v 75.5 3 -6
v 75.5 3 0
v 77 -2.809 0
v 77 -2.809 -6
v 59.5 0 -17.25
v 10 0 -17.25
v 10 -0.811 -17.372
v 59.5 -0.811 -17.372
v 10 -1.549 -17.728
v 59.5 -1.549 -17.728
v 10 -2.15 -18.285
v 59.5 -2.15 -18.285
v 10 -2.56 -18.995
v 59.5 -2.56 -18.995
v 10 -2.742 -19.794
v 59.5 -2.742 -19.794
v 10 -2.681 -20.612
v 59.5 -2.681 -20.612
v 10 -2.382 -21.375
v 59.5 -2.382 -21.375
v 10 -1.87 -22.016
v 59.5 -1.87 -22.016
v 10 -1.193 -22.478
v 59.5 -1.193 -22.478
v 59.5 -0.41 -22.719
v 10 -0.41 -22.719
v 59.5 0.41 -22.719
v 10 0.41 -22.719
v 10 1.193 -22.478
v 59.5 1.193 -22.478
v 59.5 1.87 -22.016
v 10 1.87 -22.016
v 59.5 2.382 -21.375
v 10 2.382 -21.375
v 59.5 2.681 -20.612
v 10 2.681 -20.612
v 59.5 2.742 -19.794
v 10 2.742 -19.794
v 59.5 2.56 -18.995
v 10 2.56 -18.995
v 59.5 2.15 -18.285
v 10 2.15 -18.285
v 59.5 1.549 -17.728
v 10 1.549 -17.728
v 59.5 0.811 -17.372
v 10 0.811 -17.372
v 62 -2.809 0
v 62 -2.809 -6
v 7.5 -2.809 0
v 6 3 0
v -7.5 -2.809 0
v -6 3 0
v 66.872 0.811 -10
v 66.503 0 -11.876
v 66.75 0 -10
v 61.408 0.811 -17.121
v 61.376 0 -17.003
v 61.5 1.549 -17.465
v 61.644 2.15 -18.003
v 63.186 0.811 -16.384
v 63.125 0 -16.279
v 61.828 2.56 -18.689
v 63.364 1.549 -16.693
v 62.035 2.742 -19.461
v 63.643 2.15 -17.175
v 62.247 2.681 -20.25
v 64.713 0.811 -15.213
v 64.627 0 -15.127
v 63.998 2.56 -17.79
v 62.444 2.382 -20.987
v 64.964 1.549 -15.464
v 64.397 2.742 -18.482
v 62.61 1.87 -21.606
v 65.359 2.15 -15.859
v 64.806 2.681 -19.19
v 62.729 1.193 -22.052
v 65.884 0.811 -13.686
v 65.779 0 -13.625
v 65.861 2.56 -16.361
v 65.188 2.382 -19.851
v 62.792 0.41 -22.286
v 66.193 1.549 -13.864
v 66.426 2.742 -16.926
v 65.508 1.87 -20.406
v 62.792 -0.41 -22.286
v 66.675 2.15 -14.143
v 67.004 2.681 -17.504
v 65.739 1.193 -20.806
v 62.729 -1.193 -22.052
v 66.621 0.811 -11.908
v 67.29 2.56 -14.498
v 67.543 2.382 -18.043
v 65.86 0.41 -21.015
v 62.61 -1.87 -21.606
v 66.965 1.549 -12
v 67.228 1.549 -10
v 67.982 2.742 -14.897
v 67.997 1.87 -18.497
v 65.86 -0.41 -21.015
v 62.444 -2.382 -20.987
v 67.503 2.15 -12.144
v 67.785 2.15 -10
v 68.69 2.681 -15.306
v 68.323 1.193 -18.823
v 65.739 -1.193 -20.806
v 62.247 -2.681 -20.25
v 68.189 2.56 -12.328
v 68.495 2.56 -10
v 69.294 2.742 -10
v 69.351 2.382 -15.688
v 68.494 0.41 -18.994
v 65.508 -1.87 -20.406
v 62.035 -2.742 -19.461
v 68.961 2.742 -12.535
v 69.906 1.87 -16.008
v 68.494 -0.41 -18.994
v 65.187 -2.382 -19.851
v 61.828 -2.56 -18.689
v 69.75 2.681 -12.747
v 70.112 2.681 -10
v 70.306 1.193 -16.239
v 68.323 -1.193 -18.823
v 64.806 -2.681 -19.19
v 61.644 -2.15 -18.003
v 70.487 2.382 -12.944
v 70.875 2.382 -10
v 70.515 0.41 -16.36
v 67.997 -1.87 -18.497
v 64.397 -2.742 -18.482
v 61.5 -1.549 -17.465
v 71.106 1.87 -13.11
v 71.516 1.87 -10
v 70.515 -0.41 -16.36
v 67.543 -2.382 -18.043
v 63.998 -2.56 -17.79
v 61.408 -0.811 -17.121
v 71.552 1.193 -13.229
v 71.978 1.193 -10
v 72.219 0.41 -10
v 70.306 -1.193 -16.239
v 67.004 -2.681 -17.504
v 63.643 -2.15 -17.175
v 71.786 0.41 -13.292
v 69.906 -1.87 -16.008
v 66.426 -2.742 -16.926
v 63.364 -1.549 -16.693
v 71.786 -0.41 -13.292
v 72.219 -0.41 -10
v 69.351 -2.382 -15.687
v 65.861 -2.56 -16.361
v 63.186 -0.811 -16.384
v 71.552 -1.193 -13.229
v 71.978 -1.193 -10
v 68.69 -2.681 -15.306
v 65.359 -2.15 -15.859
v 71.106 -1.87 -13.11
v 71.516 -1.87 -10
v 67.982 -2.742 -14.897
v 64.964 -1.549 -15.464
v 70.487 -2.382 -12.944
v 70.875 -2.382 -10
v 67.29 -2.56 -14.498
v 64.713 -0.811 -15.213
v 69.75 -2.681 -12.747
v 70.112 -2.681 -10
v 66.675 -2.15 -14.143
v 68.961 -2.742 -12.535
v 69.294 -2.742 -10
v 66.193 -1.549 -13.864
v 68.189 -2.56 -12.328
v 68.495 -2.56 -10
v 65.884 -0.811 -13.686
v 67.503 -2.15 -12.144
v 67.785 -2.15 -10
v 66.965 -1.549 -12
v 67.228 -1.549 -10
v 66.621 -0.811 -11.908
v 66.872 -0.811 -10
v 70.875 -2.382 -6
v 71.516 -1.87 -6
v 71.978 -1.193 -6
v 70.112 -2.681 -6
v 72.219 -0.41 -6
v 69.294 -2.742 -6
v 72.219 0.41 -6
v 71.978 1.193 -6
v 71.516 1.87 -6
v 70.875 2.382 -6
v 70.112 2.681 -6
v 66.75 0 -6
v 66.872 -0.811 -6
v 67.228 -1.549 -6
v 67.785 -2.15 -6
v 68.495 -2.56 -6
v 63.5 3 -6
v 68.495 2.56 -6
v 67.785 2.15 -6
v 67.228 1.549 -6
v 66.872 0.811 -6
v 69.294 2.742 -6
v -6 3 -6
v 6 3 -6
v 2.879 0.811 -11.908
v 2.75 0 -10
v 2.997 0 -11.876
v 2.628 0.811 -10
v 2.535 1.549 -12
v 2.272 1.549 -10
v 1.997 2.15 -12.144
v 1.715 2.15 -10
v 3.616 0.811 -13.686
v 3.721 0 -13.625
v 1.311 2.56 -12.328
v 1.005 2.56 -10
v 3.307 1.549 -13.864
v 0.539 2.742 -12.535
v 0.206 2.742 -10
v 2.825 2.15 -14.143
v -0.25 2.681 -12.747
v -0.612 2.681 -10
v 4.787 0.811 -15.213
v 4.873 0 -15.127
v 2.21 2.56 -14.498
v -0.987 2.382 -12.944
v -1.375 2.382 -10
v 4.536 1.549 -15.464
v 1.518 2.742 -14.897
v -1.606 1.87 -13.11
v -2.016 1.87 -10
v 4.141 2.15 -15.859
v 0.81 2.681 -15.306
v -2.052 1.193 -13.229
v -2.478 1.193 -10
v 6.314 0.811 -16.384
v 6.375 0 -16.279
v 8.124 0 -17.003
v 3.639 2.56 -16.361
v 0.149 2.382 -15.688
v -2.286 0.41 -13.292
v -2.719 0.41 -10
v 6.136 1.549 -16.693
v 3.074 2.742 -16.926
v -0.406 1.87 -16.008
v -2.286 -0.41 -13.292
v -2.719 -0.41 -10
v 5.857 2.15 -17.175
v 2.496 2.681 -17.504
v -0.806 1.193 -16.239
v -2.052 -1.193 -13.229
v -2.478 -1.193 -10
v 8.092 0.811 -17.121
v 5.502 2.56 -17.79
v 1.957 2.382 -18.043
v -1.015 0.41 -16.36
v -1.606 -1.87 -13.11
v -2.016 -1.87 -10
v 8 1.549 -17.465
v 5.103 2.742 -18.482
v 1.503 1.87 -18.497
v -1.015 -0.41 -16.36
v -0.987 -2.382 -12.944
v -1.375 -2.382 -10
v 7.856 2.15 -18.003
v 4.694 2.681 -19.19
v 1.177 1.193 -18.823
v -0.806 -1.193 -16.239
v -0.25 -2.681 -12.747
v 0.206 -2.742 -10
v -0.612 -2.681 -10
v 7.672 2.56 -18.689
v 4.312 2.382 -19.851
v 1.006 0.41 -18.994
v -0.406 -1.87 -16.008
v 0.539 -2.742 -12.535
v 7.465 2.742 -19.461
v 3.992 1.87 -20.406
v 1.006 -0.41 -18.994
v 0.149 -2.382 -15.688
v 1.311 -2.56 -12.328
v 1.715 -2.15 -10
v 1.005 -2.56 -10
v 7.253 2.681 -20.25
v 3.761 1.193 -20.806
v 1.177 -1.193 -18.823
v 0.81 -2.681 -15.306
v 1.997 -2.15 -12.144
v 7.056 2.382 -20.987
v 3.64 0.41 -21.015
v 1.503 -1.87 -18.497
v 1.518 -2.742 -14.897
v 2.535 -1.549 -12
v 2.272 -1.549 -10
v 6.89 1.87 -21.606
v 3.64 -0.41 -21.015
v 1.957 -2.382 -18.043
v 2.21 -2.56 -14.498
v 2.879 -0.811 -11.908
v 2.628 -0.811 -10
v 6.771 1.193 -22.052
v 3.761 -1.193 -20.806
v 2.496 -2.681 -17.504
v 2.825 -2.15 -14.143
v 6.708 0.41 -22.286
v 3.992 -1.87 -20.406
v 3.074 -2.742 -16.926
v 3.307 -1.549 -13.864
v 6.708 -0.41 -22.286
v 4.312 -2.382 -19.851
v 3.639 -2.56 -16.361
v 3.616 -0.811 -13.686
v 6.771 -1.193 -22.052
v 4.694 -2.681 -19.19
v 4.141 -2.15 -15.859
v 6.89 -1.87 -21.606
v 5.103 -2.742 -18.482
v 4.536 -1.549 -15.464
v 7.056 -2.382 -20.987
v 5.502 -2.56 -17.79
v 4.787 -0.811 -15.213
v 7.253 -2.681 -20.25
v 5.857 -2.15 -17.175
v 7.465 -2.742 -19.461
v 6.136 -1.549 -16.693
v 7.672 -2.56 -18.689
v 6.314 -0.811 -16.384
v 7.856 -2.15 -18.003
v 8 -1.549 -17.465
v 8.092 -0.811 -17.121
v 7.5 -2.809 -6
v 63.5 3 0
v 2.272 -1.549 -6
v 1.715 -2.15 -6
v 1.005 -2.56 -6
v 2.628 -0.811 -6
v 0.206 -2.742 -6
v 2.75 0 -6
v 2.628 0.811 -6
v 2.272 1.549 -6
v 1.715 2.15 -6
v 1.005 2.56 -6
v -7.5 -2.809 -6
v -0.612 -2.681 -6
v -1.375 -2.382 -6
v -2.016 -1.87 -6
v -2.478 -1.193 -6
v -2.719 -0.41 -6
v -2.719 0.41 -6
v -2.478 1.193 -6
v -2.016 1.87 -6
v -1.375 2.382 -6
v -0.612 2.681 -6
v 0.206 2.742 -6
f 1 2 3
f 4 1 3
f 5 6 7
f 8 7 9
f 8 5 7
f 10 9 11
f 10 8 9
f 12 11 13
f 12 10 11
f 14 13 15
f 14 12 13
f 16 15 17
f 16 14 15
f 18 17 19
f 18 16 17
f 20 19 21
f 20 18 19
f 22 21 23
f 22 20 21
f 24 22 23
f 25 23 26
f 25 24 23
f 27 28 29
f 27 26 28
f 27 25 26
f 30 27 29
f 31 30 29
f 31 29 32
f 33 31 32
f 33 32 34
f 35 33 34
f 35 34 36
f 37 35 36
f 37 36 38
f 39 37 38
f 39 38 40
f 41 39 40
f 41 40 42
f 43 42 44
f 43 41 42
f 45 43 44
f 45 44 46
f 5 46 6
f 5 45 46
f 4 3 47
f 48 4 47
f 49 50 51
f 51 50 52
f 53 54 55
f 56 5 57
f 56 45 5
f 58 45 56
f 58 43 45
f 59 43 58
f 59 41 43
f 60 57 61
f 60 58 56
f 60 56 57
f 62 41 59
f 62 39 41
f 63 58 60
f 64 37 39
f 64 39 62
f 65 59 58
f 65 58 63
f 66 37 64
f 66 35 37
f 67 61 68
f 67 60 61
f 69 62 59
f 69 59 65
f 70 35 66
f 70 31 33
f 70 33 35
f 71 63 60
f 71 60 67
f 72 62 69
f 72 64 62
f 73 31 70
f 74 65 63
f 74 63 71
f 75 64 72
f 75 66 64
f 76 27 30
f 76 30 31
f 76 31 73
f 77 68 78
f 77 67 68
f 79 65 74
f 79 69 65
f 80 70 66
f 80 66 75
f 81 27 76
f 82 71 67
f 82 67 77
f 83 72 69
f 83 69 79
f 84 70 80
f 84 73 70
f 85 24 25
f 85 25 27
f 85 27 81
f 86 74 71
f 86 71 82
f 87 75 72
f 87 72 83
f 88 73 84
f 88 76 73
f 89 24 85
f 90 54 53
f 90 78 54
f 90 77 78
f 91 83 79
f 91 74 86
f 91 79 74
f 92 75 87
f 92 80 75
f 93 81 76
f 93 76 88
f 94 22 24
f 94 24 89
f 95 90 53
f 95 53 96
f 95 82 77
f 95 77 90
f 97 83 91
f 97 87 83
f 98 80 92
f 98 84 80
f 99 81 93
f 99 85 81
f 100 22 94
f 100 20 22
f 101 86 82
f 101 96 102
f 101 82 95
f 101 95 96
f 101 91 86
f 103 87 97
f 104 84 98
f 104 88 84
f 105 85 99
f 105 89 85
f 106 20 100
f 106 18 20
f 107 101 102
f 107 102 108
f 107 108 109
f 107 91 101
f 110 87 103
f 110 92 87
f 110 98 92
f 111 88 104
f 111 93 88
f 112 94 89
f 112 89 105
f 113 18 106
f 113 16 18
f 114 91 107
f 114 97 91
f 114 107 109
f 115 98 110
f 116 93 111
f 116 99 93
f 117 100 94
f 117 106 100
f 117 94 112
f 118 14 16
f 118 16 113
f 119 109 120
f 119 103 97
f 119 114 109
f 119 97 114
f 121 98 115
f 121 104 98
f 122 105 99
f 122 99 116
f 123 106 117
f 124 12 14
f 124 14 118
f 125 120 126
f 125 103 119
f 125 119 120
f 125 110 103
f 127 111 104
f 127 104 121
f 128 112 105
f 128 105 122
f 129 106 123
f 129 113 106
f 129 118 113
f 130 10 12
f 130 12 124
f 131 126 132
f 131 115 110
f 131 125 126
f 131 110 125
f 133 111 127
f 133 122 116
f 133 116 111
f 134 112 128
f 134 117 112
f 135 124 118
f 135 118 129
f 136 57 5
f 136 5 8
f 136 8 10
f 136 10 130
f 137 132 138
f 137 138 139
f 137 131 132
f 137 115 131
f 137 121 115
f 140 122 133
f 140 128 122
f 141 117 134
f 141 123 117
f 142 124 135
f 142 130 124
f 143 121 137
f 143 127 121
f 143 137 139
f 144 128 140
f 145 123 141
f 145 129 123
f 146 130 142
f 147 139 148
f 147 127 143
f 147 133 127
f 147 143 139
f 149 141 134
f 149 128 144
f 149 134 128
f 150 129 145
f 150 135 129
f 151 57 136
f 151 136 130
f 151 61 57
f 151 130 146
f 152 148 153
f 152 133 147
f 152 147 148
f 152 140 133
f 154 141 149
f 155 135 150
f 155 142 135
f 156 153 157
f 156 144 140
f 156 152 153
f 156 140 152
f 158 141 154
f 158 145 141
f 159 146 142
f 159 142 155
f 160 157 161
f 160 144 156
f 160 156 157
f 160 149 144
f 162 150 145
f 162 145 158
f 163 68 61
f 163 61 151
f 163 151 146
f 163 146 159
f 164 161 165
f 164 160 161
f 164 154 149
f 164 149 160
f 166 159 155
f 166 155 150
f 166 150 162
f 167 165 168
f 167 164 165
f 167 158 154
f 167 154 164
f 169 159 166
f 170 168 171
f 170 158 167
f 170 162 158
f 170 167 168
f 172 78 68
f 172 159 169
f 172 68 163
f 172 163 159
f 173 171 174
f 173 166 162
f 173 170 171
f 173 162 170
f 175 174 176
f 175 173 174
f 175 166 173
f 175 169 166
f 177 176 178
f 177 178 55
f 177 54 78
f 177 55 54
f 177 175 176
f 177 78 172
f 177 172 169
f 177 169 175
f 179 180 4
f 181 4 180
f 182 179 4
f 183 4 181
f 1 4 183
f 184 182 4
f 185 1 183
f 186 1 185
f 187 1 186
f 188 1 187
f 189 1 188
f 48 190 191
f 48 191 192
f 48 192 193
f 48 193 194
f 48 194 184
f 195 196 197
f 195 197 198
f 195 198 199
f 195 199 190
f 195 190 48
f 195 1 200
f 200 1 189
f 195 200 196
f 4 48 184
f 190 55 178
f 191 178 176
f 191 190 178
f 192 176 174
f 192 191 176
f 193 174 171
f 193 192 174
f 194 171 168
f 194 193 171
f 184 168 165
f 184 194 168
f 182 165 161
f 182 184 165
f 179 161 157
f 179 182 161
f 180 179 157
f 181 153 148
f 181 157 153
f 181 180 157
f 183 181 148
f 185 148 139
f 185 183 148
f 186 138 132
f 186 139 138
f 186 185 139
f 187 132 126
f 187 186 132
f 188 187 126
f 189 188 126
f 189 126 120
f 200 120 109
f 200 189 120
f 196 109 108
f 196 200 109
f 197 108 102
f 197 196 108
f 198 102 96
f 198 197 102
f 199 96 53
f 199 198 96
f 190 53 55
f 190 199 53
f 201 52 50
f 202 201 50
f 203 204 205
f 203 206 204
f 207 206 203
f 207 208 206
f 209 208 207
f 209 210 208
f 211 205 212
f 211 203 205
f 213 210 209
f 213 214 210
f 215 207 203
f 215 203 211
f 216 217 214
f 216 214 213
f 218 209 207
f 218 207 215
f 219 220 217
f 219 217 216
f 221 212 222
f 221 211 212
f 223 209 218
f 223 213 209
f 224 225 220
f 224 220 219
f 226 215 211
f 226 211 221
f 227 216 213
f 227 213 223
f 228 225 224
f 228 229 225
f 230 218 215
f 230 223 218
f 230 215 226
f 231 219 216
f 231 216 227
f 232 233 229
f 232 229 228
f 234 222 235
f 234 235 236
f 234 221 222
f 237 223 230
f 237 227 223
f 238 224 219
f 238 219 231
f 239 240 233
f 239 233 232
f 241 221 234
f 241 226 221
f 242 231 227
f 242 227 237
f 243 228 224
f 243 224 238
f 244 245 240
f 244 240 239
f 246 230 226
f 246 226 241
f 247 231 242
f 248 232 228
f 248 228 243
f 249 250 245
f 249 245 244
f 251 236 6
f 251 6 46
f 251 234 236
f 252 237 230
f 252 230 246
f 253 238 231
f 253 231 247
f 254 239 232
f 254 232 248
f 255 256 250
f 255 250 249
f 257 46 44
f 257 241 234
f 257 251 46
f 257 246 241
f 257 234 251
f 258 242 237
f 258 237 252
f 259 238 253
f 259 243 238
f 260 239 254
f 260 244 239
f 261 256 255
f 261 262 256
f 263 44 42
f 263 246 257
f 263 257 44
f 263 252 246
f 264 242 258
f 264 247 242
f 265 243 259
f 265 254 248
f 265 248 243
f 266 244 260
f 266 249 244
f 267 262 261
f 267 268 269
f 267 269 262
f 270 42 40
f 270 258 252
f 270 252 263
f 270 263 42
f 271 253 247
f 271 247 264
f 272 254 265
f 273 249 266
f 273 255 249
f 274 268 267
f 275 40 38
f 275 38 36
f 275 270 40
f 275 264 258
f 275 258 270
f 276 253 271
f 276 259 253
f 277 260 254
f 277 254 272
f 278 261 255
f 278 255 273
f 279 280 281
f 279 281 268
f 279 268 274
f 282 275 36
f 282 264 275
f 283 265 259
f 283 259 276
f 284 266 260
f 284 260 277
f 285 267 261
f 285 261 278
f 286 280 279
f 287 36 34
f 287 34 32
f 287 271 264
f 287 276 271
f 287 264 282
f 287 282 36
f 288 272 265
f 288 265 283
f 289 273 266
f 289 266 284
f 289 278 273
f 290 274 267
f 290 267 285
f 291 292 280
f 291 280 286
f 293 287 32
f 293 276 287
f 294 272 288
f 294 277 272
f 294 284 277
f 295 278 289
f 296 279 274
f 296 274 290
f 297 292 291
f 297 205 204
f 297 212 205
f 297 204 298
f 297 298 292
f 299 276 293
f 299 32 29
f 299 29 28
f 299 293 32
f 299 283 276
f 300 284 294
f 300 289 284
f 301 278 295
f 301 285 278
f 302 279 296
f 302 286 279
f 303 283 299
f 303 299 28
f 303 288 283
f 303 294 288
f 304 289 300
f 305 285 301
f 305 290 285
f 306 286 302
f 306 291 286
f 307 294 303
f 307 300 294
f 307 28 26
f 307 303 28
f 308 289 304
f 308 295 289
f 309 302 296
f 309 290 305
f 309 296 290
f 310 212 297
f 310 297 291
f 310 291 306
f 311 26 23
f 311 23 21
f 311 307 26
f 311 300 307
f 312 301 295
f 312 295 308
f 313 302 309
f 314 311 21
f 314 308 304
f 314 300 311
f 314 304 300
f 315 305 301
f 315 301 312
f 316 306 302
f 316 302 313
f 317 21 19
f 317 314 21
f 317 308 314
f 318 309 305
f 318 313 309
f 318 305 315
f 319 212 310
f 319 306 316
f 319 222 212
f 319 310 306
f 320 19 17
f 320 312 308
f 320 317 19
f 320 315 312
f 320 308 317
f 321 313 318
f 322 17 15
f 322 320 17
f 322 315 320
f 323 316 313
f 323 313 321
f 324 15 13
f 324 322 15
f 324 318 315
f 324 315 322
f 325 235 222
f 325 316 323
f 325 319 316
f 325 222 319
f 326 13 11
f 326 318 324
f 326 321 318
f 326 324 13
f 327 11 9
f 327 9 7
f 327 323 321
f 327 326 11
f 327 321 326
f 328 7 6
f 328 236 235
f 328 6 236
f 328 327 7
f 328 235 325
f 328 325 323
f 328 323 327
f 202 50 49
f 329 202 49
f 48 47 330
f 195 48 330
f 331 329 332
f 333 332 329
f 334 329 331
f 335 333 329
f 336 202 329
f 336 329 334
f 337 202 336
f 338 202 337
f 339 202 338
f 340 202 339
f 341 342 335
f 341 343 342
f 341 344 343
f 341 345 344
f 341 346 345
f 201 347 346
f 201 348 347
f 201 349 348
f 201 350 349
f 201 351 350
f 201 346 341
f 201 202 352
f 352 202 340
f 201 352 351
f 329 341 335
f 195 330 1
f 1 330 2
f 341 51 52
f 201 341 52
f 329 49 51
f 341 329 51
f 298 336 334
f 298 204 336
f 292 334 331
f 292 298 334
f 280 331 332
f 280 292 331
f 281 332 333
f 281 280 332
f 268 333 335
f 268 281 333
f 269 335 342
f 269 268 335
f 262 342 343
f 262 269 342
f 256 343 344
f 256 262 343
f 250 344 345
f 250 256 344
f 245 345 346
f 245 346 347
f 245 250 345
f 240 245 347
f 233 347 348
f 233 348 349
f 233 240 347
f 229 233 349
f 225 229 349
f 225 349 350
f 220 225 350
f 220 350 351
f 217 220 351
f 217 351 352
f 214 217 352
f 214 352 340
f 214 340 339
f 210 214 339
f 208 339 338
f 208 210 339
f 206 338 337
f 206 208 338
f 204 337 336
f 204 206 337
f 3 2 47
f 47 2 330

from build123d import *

# Parameters (mm, degrees)
SKETCH_2_R      = 2.75
EXTRUDE_1_DEPTH = 6
EXTRUDE_2_DEPTH = 6


with BuildPart() as part:
    # По траектории1: sweep along a path in Эскиз1
    with BuildLine(Plane(origin=(0, 0, 0), x_dir=(1, 0, 0), z_dir=(0, 1, 0))) as sweep_1_path:
        Line((0, 0), (0, 10))
        ThreePointArc((0, 10), (2.928932188, 17.071067812), (10, 20))
        Line((10, 20), (59.5, 20))
        ThreePointArc((59.5, 20), (66.571067812, 17.071067812), (69.5, 10))
        Line((69.5, 10), (69.5, 0))
    # Эскиз2 → По траектории1 (sweep)
    with BuildSketch(Plane.XY):
        Circle(SKETCH_2_R)
    sweep(path=sweep_1_path.line)

    # Эскиз3 → Бобышка-Вытянуть1 (add)
    with BuildSketch(Plane.XY):
        Polygon((-6, 3), (6, 3), (7.5, -2.809475019), (-7.5, -2.809475019), align=None)
    extrude(amount=-EXTRUDE_1_DEPTH)

    # Эскиз4 → Бобышка-Вытянуть2 (add)
    with BuildSketch(Plane.XY):
        Polygon((63.5, 3), (75.5, 3), (77, -2.809475019), (62, -2.809475019), align=None)
    extrude(amount=-EXTRUDE_2_DEPTH)


solid = part.part
